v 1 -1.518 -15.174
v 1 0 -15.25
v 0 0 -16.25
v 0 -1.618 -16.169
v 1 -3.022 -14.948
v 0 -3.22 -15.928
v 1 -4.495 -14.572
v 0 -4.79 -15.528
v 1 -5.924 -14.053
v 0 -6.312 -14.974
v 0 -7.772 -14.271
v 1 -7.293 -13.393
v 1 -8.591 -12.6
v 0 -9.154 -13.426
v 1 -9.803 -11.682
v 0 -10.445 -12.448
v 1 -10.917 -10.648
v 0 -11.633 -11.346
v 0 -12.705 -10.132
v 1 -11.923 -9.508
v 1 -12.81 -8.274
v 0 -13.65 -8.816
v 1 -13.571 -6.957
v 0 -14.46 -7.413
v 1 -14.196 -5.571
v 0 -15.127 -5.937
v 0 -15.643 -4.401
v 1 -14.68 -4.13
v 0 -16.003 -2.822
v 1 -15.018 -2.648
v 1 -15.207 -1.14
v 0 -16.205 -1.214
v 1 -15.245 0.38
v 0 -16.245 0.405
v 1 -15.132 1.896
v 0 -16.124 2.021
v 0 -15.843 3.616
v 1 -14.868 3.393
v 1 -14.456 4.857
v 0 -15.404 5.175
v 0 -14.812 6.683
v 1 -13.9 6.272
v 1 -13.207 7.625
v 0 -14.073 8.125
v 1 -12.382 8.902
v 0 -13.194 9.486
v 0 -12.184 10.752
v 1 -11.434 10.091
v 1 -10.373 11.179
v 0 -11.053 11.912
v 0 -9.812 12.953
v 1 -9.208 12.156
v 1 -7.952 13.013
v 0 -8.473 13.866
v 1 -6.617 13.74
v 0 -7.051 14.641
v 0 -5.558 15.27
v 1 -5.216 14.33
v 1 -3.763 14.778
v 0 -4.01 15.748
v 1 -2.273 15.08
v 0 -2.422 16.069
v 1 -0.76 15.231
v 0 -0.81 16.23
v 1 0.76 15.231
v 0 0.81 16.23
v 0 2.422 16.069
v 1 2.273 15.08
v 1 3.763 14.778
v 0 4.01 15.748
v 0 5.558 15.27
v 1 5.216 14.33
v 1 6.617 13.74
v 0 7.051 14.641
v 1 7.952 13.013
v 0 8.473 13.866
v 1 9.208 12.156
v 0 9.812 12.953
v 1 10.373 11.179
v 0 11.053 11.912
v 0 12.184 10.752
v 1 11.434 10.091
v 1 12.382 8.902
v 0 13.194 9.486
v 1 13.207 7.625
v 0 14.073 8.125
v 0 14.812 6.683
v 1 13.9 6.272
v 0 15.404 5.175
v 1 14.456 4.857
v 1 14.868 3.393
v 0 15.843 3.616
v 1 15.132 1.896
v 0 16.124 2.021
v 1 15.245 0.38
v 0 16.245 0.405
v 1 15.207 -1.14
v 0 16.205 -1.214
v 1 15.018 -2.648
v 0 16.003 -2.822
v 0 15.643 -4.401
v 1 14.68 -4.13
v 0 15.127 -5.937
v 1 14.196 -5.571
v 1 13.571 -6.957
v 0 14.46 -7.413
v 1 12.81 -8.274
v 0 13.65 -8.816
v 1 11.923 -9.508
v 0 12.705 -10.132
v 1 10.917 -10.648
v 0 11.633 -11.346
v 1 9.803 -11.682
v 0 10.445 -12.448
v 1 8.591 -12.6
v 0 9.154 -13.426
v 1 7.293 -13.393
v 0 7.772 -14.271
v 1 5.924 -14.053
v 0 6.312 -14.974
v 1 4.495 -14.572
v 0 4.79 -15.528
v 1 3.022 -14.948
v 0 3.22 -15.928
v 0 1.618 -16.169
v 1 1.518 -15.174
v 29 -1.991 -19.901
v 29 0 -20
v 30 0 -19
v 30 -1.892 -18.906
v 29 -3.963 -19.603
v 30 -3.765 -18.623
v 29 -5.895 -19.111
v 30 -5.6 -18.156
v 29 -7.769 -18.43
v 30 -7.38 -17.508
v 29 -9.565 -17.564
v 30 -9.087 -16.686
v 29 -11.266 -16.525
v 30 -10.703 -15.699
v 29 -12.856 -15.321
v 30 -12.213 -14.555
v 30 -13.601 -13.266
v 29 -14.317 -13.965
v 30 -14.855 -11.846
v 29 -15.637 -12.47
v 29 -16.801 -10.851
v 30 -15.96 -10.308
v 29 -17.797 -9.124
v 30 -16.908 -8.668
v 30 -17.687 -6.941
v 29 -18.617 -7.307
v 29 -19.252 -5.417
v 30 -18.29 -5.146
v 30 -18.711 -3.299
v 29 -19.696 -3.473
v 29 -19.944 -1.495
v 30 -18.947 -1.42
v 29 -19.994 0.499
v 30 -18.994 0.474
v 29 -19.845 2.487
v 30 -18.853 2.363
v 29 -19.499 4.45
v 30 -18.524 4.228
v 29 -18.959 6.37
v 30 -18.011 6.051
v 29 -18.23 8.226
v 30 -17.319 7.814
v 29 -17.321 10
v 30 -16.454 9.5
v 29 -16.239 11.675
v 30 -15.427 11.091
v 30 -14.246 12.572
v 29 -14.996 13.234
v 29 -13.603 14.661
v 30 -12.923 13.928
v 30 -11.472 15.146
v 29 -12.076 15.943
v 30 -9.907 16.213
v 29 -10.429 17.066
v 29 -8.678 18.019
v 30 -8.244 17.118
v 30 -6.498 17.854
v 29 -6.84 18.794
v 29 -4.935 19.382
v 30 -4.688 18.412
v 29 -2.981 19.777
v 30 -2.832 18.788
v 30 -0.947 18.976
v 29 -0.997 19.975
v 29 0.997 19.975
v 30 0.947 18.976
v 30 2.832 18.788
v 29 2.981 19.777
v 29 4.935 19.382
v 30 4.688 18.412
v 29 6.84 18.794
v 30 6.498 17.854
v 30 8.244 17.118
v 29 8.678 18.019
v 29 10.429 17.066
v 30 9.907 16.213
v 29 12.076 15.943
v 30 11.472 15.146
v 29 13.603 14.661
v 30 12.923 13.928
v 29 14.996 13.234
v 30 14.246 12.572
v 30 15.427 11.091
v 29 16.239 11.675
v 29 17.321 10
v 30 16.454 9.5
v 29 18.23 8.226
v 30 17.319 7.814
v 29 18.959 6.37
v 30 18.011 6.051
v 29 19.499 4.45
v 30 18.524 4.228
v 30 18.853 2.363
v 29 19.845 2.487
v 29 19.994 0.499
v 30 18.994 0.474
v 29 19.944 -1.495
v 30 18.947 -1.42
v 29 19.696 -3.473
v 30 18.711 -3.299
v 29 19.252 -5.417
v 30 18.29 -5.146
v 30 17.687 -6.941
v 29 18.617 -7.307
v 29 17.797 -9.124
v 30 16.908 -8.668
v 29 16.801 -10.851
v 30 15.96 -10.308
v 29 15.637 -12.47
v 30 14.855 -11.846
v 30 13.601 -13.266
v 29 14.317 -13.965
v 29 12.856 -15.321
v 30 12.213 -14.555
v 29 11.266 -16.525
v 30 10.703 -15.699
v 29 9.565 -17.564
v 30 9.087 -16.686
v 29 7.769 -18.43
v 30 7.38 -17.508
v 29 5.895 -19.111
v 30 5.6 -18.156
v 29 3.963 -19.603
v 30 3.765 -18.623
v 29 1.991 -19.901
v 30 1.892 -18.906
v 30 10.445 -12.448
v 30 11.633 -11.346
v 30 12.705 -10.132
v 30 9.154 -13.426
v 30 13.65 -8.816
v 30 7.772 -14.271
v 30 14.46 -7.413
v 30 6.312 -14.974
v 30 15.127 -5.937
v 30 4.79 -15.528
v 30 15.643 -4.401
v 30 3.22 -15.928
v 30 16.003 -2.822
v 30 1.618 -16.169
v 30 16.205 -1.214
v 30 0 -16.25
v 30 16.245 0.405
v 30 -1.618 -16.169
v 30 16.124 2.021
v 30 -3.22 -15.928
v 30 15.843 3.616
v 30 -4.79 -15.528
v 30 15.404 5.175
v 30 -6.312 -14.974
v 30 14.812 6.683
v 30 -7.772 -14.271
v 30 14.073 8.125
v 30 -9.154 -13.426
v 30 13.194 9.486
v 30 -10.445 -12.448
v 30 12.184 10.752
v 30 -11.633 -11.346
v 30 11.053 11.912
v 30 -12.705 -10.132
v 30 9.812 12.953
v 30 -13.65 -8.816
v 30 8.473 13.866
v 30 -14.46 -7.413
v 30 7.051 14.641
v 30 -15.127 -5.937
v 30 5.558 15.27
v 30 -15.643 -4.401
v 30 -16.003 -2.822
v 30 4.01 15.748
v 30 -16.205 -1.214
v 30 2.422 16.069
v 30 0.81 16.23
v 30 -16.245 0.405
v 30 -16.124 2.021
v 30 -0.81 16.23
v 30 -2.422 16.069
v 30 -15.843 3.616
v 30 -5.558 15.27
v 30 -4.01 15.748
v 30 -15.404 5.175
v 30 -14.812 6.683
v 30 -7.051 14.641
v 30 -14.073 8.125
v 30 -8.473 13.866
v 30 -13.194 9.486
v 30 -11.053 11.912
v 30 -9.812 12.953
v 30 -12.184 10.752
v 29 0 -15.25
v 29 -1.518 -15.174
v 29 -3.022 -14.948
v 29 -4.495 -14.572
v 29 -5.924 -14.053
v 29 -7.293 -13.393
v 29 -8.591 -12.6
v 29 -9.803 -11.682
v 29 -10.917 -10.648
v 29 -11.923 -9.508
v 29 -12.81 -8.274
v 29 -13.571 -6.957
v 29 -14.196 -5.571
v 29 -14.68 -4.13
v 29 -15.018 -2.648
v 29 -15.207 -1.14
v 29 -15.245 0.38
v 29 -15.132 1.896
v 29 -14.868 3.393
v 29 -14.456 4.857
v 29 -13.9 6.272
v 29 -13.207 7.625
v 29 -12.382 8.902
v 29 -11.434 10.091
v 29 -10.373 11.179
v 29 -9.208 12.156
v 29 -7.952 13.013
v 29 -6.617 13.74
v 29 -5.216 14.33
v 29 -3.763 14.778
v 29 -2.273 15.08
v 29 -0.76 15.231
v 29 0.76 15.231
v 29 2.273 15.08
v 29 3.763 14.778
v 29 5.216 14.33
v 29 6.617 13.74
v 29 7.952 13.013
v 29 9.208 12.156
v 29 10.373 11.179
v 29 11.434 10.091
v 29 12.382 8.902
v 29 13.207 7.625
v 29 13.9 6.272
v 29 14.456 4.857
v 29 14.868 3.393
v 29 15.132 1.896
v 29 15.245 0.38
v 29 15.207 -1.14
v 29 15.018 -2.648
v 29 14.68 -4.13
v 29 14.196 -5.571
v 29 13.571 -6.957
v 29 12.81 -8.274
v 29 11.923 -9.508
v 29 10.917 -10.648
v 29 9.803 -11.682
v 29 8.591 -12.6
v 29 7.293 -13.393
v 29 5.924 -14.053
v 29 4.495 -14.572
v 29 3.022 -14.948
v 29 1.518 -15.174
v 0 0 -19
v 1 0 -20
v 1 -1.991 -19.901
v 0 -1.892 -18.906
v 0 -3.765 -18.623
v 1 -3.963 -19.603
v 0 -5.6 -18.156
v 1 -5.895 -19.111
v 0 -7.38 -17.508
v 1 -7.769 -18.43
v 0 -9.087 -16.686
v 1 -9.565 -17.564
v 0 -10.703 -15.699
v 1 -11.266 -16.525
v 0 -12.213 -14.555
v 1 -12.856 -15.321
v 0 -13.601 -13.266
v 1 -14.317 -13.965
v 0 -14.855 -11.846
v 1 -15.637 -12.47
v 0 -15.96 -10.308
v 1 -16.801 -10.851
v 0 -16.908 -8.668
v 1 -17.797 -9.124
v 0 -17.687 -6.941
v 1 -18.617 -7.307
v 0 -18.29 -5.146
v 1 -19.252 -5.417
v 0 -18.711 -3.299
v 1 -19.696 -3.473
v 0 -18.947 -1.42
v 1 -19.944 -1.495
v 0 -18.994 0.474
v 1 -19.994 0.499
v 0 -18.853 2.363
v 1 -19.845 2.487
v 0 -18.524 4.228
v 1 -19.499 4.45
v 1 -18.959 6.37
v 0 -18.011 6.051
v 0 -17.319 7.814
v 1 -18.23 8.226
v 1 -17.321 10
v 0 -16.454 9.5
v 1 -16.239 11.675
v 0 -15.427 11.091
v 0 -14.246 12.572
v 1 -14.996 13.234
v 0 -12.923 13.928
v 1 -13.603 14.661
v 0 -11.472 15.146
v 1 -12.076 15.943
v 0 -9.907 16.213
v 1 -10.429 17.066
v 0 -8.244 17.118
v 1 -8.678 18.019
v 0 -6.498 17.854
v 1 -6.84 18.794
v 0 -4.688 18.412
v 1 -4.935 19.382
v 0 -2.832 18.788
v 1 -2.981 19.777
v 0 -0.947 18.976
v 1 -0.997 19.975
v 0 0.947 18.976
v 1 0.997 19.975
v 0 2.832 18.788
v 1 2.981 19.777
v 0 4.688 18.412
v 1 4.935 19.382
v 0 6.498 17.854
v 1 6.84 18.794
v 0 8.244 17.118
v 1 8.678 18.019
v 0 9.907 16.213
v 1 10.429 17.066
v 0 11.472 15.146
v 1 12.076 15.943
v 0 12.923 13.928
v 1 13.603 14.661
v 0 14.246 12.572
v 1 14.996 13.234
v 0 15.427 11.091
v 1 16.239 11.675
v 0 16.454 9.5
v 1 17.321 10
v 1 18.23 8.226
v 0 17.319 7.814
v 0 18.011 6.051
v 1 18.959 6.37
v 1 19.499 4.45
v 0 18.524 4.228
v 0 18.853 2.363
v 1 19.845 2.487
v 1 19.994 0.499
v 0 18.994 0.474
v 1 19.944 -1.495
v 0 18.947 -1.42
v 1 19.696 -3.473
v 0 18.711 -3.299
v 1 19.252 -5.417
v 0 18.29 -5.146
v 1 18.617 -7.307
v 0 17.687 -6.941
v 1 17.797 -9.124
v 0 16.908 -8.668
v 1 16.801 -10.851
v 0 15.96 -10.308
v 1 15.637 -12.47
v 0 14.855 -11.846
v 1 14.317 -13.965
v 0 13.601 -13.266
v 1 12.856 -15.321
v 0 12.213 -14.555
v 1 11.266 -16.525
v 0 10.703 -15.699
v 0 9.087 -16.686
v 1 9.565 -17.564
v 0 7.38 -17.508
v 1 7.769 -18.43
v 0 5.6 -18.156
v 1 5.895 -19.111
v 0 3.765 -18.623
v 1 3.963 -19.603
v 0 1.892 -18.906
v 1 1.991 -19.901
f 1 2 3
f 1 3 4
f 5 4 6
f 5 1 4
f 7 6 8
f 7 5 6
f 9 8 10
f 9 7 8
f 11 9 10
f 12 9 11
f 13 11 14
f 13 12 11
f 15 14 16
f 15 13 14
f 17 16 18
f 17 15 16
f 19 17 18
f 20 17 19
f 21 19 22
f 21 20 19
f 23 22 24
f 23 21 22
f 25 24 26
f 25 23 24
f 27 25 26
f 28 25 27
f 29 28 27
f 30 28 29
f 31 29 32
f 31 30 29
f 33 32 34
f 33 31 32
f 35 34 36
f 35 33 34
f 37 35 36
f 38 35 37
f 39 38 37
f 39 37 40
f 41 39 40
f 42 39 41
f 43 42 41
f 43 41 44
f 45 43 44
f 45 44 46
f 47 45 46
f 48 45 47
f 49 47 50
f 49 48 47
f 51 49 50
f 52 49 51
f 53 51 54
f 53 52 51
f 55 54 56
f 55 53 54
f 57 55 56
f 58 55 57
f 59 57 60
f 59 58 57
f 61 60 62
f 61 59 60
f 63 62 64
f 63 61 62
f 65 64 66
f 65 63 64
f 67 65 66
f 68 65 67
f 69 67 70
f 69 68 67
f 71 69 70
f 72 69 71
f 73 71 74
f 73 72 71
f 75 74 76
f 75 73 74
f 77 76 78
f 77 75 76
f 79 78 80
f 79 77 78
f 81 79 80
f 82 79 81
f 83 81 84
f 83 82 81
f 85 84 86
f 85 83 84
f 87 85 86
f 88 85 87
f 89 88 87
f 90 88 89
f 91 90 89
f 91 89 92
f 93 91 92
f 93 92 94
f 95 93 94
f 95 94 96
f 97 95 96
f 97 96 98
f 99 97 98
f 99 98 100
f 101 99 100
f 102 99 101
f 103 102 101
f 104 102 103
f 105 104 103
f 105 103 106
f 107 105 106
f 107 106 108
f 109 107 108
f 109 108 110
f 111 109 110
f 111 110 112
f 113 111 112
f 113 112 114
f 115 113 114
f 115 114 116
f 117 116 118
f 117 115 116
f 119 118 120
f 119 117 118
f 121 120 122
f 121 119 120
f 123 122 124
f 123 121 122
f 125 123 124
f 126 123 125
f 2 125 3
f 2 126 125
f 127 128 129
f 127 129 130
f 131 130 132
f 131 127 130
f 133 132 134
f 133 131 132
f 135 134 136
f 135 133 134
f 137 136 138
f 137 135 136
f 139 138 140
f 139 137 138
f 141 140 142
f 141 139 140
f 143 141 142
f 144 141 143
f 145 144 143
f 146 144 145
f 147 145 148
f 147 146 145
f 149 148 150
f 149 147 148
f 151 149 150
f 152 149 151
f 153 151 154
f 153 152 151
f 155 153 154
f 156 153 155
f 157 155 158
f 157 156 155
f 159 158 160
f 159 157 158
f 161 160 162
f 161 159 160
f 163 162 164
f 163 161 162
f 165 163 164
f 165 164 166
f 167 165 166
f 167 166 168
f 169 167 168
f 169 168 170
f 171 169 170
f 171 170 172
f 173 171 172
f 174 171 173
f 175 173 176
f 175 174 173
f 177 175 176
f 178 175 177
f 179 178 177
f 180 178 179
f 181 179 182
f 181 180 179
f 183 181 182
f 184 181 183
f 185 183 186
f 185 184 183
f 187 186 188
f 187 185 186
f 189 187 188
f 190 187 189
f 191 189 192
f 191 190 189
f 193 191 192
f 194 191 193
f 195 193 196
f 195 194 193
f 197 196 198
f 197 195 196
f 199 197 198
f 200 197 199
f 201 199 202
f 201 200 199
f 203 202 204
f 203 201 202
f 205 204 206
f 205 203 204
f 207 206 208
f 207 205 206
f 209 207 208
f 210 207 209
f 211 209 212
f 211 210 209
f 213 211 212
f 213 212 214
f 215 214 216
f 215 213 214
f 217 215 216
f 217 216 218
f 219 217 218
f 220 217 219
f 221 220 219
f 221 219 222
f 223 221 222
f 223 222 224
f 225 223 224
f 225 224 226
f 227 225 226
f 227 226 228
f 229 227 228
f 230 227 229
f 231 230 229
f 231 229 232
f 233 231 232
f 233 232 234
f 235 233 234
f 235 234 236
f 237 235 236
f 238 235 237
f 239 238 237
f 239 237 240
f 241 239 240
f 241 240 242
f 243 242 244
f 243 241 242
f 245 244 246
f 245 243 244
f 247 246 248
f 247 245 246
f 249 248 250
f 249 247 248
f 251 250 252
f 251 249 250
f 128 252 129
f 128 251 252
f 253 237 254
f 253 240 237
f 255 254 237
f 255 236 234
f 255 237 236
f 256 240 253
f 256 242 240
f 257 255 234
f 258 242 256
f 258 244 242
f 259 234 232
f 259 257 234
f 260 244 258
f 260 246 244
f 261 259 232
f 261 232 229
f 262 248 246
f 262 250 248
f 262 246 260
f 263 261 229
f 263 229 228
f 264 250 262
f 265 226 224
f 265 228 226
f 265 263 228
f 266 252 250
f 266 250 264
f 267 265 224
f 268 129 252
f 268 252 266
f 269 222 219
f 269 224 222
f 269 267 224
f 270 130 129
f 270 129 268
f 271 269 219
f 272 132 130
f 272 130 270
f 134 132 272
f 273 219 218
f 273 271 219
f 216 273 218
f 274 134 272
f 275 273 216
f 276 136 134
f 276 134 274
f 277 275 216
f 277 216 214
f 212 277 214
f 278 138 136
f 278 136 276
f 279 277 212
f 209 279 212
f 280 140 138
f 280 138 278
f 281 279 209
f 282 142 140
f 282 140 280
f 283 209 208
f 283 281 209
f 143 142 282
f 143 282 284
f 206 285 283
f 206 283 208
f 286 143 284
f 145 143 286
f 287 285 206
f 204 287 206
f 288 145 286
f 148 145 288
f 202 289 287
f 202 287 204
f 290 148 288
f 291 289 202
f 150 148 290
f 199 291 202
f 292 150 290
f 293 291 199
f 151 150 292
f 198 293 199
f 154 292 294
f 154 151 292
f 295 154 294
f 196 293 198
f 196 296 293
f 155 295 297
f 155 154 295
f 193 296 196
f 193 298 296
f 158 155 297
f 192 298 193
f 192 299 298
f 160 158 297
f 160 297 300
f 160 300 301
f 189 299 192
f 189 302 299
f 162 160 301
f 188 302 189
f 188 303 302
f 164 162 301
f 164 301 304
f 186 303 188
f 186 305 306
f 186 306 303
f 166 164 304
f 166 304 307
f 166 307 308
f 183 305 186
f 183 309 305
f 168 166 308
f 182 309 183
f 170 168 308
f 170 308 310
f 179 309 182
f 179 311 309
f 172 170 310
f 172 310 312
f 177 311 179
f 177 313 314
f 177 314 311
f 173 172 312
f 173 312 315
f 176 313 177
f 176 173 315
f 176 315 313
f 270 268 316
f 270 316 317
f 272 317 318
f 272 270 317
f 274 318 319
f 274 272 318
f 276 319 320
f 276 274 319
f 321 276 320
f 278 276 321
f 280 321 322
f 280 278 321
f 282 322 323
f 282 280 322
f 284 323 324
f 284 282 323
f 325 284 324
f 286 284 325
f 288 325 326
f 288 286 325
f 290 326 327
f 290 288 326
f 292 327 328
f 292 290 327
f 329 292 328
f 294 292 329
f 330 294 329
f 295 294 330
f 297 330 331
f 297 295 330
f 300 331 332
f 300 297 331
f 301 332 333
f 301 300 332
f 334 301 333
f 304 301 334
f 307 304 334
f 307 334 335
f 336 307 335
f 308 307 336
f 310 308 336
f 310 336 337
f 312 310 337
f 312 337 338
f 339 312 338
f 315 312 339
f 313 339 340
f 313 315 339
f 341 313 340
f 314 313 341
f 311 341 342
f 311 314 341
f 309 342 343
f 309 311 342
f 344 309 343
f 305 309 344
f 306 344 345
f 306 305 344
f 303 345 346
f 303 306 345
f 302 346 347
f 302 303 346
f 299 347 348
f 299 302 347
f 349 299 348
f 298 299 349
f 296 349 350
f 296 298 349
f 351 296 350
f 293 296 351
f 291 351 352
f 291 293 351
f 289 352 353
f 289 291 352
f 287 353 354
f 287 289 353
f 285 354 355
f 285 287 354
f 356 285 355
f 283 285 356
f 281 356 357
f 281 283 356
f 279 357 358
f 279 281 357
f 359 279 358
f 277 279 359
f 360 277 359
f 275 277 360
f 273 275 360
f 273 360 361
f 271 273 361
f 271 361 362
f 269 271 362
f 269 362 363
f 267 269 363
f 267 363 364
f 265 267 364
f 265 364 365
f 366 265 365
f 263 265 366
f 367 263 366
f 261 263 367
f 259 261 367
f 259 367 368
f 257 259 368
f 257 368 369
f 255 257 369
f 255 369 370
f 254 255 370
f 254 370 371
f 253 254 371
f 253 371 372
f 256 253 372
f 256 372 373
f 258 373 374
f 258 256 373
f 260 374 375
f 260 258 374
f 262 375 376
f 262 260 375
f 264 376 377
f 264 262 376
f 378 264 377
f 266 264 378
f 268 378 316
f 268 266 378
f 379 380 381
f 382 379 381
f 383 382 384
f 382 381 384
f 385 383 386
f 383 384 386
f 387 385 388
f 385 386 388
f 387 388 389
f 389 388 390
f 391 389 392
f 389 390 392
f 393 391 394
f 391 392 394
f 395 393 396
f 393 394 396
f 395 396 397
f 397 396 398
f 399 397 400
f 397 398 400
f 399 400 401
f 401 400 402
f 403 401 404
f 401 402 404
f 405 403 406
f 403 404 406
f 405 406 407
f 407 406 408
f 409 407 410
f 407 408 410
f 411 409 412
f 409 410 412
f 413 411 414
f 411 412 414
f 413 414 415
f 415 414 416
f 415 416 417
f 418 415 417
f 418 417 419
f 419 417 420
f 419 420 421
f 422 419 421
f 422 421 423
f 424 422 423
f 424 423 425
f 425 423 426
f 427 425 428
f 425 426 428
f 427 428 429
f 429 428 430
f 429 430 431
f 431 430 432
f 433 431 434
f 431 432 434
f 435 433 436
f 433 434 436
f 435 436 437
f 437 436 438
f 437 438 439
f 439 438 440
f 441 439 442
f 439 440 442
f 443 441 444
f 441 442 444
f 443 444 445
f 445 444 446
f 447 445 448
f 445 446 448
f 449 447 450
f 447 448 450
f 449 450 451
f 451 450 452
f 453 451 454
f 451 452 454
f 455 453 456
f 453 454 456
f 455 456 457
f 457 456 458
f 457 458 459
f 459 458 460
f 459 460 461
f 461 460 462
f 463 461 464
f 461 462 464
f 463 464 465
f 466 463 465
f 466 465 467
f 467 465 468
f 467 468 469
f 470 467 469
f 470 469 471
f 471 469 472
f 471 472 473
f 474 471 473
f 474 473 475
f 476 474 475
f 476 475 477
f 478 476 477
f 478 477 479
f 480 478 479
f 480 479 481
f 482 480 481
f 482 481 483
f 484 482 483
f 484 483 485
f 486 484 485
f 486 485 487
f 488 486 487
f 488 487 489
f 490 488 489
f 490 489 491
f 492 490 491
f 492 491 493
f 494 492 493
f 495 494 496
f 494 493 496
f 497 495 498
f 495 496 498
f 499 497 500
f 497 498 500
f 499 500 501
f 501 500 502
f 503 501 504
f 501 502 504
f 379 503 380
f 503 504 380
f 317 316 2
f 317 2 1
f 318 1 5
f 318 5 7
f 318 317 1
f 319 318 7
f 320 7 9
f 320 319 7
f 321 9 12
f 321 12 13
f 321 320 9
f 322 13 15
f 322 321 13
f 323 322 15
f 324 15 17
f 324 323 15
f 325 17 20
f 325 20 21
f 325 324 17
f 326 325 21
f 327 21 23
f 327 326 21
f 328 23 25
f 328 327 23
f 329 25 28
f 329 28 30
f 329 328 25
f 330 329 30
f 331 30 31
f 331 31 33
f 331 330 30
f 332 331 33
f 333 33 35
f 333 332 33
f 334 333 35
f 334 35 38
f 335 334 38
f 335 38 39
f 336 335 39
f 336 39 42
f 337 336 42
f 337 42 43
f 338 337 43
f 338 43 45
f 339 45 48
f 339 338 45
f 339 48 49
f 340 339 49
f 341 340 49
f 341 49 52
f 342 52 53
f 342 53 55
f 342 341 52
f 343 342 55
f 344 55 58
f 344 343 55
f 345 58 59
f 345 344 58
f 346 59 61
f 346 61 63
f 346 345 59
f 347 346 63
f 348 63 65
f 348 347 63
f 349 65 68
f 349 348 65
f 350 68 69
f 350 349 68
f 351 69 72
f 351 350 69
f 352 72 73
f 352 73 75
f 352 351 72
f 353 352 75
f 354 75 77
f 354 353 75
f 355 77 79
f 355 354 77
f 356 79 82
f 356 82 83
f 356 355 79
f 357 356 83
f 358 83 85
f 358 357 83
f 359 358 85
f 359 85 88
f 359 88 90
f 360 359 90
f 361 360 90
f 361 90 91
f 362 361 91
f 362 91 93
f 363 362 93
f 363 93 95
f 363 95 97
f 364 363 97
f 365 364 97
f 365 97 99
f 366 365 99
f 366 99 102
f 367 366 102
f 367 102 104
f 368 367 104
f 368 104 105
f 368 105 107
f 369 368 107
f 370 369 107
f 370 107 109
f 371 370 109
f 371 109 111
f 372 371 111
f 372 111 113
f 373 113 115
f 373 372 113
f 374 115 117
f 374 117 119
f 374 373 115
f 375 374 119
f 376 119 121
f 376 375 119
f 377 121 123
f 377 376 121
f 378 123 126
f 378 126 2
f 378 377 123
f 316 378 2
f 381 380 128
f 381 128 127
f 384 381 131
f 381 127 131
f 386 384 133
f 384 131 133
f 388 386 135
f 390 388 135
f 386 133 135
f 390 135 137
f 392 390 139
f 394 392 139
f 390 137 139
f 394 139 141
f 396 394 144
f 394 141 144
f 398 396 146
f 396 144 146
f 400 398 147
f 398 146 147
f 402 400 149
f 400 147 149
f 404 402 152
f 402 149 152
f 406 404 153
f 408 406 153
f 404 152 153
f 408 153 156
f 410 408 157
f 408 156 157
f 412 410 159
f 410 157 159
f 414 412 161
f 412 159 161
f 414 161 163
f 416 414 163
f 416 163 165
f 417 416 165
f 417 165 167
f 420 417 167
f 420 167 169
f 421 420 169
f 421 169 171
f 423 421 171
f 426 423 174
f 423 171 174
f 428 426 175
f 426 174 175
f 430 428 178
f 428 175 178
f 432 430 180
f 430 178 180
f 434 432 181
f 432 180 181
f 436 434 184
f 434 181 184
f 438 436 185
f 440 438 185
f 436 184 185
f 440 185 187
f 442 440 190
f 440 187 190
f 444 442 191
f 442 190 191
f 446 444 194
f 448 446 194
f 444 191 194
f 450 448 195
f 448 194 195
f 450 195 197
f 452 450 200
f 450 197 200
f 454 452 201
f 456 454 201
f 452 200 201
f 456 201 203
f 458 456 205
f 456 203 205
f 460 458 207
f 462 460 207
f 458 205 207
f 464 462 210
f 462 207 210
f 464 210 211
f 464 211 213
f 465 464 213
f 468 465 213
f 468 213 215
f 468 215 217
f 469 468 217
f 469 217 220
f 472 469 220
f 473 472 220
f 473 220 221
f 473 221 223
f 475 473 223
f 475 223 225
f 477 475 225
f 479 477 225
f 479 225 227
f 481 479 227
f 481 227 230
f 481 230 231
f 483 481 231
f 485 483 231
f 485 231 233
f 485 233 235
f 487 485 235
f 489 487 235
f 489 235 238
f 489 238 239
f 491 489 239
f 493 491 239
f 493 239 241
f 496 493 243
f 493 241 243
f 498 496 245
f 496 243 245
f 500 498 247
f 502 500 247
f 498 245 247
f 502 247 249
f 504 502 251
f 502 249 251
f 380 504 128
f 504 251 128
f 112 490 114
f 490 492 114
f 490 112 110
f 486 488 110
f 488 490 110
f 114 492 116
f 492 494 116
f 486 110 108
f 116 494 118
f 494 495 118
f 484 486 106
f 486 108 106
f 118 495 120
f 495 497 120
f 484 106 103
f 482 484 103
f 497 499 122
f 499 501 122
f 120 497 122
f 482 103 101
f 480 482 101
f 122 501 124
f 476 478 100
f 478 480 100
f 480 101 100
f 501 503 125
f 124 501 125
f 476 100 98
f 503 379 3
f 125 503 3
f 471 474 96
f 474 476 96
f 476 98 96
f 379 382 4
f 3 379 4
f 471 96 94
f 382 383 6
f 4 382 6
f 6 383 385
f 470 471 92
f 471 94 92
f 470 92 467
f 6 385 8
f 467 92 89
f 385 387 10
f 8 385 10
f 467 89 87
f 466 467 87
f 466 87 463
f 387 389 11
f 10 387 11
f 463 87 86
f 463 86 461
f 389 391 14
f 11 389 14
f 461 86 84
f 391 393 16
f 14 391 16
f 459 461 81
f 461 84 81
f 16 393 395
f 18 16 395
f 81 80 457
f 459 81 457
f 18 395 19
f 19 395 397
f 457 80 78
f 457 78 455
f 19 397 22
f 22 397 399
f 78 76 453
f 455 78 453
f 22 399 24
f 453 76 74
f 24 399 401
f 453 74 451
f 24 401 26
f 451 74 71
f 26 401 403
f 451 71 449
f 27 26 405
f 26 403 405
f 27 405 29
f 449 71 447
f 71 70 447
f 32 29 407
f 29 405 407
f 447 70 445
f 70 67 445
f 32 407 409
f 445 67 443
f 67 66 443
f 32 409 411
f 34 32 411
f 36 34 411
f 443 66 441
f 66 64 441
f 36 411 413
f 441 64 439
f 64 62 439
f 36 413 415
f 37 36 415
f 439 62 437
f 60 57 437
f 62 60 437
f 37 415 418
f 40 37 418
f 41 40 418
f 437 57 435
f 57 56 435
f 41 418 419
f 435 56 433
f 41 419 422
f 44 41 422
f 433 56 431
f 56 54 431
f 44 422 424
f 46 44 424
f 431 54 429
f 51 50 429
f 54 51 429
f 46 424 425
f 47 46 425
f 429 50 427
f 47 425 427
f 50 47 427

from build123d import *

# Parameters (mm, degrees)
SKETCH_1_W     = 30
SKETCH_1_H     = 4.75
CHAMFER_1_SIZE = 1
CHAMFER_2_SIZE = 1


with BuildPart() as part:
    # Эскиз1 → Повернуть1 (revolve)
    with BuildSketch(Plane.XY, mode=Mode.PRIVATE) as revolve_1_sk:
        with Locations((15, 17.625)):
            Rectangle(SKETCH_1_W, SKETCH_1_H)
    revolve(revolve_1_sk.sketch.rotate(Axis((0, 0, 0), (-1, 0, 0)), 90), axis=Axis((0, 0, 0), (-1, 0, 0)))

    # Фаска1
    chamfer_1_edges = [part.edges().sort_by_distance(p)[0] for p in [
        (0, 0, 20),
        (30, 0, 20),
    ]]
    chamfer(chamfer_1_edges, length=CHAMFER_1_SIZE)

    # Фаска2
    chamfer_2_edges = [part.edges().sort_by_distance(p)[0] for p in [
        (30, 0, 15.25),
        (0, 0, 15.25),
    ]]
    chamfer(chamfer_2_edges, length=CHAMFER_2_SIZE)


solid = part.part
